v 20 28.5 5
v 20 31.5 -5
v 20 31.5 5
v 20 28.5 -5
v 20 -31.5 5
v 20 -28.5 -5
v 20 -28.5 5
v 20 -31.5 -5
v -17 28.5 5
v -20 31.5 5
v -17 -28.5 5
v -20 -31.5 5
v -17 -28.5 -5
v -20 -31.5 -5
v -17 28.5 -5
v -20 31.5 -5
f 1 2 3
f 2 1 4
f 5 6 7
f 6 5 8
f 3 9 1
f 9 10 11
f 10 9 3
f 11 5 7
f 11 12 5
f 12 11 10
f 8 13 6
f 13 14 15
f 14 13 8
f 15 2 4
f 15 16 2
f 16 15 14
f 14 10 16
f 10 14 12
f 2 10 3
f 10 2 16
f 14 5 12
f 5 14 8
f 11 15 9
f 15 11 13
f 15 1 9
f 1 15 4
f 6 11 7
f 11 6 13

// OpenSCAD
X=40;
Y=57;
Z=10;
difference(){
    cube([X,Y+6,Z],center=true);
    
    translate([3,0,0])cube([X,Y,Z+1],center=true);
}
